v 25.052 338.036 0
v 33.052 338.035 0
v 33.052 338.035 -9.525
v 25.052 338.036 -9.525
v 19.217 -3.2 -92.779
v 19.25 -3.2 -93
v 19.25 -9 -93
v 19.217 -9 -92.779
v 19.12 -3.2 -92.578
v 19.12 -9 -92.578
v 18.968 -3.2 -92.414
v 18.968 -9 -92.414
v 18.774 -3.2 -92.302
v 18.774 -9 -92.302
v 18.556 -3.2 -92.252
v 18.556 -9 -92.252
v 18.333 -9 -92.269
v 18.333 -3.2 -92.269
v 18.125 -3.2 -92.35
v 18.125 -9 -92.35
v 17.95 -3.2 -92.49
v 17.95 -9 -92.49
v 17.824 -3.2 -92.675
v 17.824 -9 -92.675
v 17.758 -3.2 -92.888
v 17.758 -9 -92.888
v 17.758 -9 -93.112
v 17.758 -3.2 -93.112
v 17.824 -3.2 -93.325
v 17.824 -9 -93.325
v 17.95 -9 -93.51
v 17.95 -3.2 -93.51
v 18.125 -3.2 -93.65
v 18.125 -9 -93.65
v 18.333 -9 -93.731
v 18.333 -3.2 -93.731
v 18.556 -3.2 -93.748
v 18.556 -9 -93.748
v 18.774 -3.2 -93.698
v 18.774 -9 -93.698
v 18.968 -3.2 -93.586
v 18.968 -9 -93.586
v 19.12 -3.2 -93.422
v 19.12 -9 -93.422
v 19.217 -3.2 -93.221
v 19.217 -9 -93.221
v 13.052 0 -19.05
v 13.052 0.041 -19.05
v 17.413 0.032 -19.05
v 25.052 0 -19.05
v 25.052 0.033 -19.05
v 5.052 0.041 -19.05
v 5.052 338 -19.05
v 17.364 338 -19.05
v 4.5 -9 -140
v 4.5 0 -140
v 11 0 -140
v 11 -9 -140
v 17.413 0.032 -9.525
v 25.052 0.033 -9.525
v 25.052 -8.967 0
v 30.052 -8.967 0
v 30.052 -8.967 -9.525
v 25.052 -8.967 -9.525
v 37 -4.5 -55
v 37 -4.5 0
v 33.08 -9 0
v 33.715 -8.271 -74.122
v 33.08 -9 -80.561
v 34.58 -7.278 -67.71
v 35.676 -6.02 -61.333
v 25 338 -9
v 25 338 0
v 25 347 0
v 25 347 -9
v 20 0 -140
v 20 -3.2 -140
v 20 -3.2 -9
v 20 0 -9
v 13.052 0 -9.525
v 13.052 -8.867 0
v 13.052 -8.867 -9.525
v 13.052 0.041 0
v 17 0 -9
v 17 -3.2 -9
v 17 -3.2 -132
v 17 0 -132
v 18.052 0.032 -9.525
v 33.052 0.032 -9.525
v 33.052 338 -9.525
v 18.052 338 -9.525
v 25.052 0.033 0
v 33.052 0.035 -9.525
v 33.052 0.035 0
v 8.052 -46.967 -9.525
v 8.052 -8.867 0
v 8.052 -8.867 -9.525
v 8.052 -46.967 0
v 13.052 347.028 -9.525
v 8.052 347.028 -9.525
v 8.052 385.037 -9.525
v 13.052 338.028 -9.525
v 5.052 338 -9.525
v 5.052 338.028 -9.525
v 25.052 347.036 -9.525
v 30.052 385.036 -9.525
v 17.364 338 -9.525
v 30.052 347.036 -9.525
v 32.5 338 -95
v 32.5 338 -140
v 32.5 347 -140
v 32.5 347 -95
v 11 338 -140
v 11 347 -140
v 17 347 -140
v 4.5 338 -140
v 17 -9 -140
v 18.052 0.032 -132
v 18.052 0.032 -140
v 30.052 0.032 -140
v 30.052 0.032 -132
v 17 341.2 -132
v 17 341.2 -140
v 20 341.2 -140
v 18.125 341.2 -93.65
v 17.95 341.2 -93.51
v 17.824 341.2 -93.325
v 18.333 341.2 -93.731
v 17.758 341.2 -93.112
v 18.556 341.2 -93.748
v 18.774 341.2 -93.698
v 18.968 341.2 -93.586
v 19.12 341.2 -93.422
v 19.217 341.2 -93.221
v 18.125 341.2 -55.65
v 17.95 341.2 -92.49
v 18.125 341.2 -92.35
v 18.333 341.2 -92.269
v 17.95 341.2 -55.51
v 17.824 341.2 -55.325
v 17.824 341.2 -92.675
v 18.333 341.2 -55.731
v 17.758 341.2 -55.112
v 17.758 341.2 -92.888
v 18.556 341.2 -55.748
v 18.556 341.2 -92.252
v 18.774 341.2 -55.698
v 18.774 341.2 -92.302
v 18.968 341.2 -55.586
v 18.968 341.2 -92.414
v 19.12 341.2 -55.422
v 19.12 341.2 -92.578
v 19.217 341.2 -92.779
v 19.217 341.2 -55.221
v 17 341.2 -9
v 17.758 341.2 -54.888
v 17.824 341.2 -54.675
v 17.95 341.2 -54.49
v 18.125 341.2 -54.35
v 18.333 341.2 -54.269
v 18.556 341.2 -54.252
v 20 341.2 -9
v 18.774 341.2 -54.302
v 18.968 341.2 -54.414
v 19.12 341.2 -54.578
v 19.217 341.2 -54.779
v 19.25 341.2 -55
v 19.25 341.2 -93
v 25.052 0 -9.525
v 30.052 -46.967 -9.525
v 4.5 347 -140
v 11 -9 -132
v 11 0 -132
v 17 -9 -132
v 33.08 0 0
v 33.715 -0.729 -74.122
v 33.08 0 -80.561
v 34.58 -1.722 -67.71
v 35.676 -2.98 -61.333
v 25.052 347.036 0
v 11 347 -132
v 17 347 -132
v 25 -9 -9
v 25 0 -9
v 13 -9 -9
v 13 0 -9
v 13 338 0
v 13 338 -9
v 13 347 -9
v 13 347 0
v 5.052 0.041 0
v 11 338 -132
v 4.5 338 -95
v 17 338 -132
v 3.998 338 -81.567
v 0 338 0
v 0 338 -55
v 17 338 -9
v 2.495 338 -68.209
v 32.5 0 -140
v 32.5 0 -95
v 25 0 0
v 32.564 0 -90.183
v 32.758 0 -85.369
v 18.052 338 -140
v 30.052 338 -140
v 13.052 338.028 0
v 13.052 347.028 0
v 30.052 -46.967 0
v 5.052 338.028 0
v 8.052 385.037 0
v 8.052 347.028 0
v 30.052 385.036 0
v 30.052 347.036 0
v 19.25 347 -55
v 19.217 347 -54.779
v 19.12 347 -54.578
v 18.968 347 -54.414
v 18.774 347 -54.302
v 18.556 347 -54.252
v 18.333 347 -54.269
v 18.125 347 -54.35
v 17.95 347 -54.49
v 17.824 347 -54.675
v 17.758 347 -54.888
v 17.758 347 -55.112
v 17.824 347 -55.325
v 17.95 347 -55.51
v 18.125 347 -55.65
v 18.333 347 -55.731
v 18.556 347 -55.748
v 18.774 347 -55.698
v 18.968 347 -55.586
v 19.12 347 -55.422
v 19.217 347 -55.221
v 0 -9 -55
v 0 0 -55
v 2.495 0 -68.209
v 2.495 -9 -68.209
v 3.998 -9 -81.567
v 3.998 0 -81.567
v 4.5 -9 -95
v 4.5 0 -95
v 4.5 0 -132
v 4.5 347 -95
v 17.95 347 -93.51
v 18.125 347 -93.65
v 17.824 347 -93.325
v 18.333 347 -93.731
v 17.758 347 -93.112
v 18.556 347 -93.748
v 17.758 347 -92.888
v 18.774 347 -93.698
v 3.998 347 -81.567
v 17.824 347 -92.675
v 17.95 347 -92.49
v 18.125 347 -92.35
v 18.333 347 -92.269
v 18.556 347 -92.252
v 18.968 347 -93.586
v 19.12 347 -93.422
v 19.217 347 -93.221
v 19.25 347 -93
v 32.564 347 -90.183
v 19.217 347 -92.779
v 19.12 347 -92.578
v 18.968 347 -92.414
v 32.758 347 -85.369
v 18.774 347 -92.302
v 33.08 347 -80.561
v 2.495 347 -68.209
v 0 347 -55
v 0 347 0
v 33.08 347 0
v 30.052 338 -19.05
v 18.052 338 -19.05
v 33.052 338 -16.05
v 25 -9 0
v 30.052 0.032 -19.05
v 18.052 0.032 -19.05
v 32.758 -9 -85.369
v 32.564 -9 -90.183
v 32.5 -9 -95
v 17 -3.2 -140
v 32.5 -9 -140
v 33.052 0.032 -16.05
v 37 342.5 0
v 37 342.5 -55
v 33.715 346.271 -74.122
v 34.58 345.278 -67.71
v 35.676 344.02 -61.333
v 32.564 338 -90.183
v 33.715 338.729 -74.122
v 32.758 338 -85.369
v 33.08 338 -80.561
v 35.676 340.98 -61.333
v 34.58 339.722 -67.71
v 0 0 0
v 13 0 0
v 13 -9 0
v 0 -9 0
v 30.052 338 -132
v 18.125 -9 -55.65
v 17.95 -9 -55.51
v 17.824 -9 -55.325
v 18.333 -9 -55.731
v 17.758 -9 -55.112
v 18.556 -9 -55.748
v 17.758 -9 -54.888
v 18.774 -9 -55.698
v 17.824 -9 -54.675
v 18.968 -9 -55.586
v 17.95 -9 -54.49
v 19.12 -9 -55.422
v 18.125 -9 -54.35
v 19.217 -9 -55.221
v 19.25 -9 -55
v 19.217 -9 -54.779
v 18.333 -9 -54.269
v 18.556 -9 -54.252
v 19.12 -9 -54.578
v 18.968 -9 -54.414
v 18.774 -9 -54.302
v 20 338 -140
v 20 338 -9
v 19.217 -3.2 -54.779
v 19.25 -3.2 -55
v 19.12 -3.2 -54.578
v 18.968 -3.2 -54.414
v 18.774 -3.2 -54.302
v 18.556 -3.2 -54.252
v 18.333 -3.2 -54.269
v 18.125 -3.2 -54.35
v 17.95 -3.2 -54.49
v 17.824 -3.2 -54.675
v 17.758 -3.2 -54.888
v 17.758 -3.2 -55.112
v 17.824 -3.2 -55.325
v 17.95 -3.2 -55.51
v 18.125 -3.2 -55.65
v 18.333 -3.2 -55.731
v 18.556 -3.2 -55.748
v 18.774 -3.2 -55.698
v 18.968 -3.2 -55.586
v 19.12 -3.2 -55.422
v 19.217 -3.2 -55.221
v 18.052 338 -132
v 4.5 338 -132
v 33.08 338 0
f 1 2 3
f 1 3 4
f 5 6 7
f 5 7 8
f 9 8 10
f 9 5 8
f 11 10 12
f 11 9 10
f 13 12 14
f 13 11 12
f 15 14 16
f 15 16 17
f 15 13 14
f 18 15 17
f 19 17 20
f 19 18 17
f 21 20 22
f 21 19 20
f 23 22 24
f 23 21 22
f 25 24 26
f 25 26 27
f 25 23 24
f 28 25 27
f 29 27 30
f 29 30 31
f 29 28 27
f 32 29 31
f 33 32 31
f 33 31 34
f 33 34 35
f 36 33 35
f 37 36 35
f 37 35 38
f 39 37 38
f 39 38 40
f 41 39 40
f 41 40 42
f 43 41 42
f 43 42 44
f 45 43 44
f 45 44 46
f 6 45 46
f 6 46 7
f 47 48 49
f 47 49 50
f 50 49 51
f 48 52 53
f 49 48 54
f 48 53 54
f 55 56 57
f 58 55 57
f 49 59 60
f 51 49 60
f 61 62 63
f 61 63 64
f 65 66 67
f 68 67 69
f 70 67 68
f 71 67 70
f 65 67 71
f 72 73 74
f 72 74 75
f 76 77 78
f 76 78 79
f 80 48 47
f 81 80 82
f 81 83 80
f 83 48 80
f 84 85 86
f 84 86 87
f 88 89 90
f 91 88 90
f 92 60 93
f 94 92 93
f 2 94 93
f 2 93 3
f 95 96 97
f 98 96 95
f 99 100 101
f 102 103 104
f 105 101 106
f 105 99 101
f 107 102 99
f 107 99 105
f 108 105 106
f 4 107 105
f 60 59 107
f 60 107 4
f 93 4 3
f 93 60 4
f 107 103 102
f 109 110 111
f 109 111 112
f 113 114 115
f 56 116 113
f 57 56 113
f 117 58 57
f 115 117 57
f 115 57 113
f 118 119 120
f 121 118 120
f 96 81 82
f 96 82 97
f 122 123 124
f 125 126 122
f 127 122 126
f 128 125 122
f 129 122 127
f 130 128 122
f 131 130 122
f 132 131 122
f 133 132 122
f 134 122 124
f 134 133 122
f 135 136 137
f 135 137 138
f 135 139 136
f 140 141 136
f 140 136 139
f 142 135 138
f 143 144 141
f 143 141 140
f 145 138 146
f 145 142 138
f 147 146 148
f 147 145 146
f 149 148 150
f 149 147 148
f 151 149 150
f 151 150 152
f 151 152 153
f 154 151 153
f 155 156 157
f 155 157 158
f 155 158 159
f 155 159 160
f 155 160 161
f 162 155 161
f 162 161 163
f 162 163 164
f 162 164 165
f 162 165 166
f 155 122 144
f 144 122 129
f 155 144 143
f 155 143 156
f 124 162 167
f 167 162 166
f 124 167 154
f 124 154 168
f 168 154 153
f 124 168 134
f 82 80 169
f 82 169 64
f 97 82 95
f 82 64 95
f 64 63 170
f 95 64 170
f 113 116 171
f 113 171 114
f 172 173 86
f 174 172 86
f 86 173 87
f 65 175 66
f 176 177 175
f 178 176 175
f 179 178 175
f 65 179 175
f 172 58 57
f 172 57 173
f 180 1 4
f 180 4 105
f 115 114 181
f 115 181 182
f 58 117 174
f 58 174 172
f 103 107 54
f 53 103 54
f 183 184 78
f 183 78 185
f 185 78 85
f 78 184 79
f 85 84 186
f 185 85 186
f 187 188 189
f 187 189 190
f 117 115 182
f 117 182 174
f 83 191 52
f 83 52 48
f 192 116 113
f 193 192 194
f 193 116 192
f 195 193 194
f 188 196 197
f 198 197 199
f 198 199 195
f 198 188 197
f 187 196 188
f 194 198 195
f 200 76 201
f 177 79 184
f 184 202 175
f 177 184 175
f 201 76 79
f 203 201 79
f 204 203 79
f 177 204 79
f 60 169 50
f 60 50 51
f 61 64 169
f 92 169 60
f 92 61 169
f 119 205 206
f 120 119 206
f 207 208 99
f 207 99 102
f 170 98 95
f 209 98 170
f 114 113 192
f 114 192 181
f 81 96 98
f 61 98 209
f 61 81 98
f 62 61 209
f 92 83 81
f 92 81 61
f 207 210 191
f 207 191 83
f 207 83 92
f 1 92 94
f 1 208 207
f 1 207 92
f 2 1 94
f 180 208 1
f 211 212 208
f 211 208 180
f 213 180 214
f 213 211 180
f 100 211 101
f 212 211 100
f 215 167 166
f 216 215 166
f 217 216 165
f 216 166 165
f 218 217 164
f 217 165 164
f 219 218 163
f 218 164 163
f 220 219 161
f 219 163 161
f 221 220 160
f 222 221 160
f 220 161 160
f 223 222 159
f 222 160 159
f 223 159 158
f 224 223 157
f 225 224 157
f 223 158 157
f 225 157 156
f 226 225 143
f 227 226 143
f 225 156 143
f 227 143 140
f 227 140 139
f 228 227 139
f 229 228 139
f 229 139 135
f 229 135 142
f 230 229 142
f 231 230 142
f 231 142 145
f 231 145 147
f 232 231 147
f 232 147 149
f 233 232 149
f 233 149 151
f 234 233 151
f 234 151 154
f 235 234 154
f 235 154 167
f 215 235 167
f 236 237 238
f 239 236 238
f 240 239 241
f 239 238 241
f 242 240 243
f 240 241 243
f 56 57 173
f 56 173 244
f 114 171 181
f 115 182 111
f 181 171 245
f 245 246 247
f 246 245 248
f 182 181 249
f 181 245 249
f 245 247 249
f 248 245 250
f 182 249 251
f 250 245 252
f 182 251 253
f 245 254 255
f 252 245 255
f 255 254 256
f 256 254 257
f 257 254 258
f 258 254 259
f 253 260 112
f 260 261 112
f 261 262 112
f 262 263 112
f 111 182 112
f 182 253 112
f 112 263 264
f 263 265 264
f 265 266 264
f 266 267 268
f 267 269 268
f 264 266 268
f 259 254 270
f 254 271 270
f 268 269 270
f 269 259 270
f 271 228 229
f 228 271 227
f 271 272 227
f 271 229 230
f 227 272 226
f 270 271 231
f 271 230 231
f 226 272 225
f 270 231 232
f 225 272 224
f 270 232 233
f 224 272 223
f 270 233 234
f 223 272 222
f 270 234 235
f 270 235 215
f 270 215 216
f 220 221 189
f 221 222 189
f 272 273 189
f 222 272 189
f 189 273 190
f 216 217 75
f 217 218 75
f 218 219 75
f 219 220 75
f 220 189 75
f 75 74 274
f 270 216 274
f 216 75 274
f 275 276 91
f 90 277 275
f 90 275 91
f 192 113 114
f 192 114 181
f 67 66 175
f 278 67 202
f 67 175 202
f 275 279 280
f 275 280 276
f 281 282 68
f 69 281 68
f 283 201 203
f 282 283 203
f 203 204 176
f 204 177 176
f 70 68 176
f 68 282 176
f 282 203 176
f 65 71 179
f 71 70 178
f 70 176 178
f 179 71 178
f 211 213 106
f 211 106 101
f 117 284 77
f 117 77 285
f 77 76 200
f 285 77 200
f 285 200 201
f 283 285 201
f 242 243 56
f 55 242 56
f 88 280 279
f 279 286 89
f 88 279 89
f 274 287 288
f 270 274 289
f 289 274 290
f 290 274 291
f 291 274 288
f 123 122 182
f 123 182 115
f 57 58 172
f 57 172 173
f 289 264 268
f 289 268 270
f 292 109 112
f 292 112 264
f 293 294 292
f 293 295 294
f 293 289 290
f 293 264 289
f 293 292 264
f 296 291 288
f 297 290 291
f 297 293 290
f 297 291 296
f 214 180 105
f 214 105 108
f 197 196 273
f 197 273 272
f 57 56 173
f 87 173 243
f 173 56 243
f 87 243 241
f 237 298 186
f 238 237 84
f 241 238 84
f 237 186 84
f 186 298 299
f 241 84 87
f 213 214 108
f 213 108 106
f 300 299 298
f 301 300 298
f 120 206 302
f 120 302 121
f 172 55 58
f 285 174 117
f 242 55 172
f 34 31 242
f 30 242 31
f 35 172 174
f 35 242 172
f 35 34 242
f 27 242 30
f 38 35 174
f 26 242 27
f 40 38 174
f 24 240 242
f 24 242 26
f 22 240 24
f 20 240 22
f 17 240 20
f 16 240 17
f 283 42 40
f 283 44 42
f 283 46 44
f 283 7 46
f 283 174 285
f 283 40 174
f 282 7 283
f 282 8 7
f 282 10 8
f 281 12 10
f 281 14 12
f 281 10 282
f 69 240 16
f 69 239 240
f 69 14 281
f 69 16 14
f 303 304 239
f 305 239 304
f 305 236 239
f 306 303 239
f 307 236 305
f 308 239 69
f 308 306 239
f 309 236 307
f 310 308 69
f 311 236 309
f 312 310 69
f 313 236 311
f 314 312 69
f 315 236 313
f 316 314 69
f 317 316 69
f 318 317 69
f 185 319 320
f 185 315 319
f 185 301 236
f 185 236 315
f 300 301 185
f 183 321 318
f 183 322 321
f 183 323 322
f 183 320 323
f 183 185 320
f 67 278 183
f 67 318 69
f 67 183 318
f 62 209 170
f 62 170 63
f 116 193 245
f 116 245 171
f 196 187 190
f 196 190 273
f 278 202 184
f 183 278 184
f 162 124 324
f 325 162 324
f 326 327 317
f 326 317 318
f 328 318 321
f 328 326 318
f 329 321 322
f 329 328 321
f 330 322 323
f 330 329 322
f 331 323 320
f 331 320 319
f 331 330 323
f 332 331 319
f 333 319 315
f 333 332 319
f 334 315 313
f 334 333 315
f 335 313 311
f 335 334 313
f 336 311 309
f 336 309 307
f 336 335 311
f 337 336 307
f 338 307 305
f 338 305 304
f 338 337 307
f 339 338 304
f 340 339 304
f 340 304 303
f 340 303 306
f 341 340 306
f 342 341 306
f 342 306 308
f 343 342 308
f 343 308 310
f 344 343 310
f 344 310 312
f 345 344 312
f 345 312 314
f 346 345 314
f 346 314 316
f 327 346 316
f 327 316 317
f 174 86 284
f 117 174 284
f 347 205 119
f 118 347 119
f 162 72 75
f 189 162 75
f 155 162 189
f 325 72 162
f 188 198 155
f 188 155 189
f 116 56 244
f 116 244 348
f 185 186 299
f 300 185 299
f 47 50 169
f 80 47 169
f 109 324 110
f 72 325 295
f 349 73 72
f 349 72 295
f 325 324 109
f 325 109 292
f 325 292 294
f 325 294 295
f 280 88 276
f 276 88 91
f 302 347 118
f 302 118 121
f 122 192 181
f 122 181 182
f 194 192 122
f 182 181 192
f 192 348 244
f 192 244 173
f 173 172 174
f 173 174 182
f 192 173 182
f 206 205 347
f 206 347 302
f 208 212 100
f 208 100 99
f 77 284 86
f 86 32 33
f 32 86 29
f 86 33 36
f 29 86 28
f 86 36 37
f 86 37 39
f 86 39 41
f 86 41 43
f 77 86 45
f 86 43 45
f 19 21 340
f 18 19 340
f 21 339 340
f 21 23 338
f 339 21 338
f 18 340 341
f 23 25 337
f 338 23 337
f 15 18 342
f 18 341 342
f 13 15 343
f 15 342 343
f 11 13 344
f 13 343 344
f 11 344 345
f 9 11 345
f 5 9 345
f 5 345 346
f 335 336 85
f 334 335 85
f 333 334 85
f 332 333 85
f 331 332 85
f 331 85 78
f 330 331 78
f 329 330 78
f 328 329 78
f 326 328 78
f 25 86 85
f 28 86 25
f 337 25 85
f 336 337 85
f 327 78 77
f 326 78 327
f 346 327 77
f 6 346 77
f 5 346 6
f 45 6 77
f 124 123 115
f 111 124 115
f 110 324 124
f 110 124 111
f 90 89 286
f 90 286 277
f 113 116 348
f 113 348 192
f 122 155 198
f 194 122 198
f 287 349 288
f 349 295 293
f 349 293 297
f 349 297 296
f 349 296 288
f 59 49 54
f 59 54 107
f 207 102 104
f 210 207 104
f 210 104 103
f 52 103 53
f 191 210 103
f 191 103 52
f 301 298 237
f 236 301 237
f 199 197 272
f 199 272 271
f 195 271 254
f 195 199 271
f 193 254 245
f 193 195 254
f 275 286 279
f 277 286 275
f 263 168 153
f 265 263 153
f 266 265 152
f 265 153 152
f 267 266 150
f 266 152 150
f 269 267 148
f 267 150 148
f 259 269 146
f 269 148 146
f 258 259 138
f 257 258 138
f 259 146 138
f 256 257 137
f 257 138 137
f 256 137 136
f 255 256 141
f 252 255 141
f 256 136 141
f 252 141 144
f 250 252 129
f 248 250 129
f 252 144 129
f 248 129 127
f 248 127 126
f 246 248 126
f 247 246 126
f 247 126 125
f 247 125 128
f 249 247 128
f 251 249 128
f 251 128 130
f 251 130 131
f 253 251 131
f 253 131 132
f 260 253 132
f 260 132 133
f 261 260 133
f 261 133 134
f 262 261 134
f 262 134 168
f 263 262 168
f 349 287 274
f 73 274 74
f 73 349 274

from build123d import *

# Parameters (mm, degrees)
F1_DEPTH  = 19.05
F2_W      = 19.9896149511
F2_H      = 15.3696622014
F3_DEPTH  = 338.0011464902
F5_DEPTH  = 28.001
F6_W      = 337.9676082338
F6_H      = 9.525
F7_DEPTH  = 15
F8_SIZE   = 3
F9_R      = 0.75
F10_DEPTH = 9
F11_W     = 3
F11_H     = 4.0192092803
F12_DEPTH = 140.001
F16_DEPTH = 8
F15_W     = 12
F15_H     = 337.9676082336


with BuildPart() as f1:
    # F0 (on Top) → F1 (new body)
    with BuildSketch(Plane.XY):
        Polygon((25.0524798076, 0.0334885936), (33.0524798076, 0.0346371813), (33.0524798076, 338.0346385675), (25.0524798078, 338.0357871552), (25.0524798076, 347.0357857691), (30.0524798076, 347.0357857691), (30.0524798076, 385.0357857691), (8.0524798076, 385.0367226312), (8.0524798076, 347.0278060534), (13.0524798076, 347.0278060534), (13.0524798076, 338.0278060534), (5.0524798076, 338.0280407086), (5.0524798076, 0.0412336541), (13.0524798076, 0.0414683092), (13.0524798076, -8.8674482686), (8.0524798076, -8.8674482686), (8.0524798076, -46.9674482686), (30.0524798076, -46.9665114967), (30.0524798076, -8.9665114064), (25.0524798076, -8.9665114064), align=None)
    extrude(amount=-F1_DEPTH)

    # F2 (on face) → F3 (cut, through all)
    with BuildSketch(Plane(origin=(-4.2917e-06, 0.0298917216, 0), x_dir=(0.9999999897, 0.0001435735, 0), z_dir=(0.0001435735, -0.9999999897, 0))):
        with Locations((27.4078074756, -17.2098311007)):
            Rectangle(F2_W, F2_H)
    extrude(amount=-F3_DEPTH, mode=Mode.SUBTRACT)

    # F4 (on face) → F5 (cut, through all)
    with BuildSketch(Plane.YZ.offset(33.0524798076)):
        Polygon((0, -22.5851237774), (0, -9.525), (-57.0387654006, -9.525), (-57.0387654006, -22.2101248801), align=None)
        Polygon((338.0346385675, -9.525), (338, -9.525), (338, -24.2499262094), (394.569247961, -24.2499262094), (394.4216072559, -9.525), align=None)
    extrude(amount=-F5_DEPTH, mode=Mode.SUBTRACT)


with BuildPart() as f7:
    # F6 (on face) → F7 (new body)
    with BuildSketch(Plane.YZ.offset(33.0524798076)):
        with Locations((169.0161958831, -14.2875)):
            Rectangle(F6_W, F6_H)
    extrude(amount=-F7_DEPTH)

    # F8
    f8_edges = [f7.edges().sort_by_distance(p)[0] for p in [
        (33.05248, 169.016196, -19.05),
    ]]
    chamfer(f8_edges, length=F8_SIZE)


with BuildPart() as f10:
    # F9 (on Front) → F10 (new body)
    with BuildSketch(Plane.XZ):
        with BuildLine():
            Line((13, 0), (0, 0))
            Line((0, 0), (0, -55))
            ThreePointArc((0, -55), (3.3714627785, -74.8738354374), (4.5, -95))
            Line((4.5, -95), (4.5, -140))
            Line((4.5, -140), (11, -140))
            Line((11, -140), (11, -132))
            Line((11, -132), (17, -132))
            Line((17, -132), (17, -140))
            Line((17, -140), (32.5, -140))
            Line((32.5, -140), (32.5, -95))
            ThreePointArc((32.5, -95), (33.6285372215, -74.8738354374), (37, -55))
            Line((37, -55), (37, 0))
            Line((37, 0), (25, 0))
            Line((25, 0), (25, -9))
            Line((25, -9), (13, -9))
            Line((13, -9), (13, 0))
        make_face()
        with Locations((18.5, -93)):
            Circle(F9_R, mode=Mode.SUBTRACT)
        with Locations((18.5, -55)):
            Circle(F9_R, mode=Mode.SUBTRACT)
    extrude(amount=F10_DEPTH)

    # F11 (on Top) → F12 (cut, through all)
    with BuildSketch(Plane.XY):
        with Locations((18.5, -1.1903953598)):
            Rectangle(F11_W, F11_H)
        Polygon((33.0799296498, 0), (37, -4.5), (33.0799296498, -9), (38.3763611317, -11.9362315163), (38.3763611317, 3.0553650577), align=None)
    extrude(amount=-F12_DEPTH, mode=Mode.SUBTRACT)


with BuildPart() as f14_1:
    # F14: instance of F10
    add(f10.part.mirror(Plane.XZ.offset(-169)))


with BuildPart() as f16:
    # F15 (on face) → F16 (new body, through all)
    with BuildSketch(Plane(origin=(0, 0, -140), x_dir=(1, 0, 0), z_dir=(0, 0, -1))):
        Polygon((17, 9), (11, 9), (11, 0), (4.5, 0), (4.5, -338), (11, -338), (11, -347), (17, -347), align=None)
    extrude(amount=-F16_DEPTH)


with BuildPart() as f16b:
    # F15 (on face) → F16, piece 2 (new body, through all)
    with BuildSketch(Plane(origin=(0, 0, -140), x_dir=(1, 0, 0), z_dir=(0, 0, -1))):
        with Locations((24.0524798076, -169.0161958832)):
            Rectangle(F15_W, F15_H)
    extrude(amount=-F16_DEPTH)


solid = Compound([f1.part, f7.part, f10.part, f14_1.part, f16.part, f16b.part])
